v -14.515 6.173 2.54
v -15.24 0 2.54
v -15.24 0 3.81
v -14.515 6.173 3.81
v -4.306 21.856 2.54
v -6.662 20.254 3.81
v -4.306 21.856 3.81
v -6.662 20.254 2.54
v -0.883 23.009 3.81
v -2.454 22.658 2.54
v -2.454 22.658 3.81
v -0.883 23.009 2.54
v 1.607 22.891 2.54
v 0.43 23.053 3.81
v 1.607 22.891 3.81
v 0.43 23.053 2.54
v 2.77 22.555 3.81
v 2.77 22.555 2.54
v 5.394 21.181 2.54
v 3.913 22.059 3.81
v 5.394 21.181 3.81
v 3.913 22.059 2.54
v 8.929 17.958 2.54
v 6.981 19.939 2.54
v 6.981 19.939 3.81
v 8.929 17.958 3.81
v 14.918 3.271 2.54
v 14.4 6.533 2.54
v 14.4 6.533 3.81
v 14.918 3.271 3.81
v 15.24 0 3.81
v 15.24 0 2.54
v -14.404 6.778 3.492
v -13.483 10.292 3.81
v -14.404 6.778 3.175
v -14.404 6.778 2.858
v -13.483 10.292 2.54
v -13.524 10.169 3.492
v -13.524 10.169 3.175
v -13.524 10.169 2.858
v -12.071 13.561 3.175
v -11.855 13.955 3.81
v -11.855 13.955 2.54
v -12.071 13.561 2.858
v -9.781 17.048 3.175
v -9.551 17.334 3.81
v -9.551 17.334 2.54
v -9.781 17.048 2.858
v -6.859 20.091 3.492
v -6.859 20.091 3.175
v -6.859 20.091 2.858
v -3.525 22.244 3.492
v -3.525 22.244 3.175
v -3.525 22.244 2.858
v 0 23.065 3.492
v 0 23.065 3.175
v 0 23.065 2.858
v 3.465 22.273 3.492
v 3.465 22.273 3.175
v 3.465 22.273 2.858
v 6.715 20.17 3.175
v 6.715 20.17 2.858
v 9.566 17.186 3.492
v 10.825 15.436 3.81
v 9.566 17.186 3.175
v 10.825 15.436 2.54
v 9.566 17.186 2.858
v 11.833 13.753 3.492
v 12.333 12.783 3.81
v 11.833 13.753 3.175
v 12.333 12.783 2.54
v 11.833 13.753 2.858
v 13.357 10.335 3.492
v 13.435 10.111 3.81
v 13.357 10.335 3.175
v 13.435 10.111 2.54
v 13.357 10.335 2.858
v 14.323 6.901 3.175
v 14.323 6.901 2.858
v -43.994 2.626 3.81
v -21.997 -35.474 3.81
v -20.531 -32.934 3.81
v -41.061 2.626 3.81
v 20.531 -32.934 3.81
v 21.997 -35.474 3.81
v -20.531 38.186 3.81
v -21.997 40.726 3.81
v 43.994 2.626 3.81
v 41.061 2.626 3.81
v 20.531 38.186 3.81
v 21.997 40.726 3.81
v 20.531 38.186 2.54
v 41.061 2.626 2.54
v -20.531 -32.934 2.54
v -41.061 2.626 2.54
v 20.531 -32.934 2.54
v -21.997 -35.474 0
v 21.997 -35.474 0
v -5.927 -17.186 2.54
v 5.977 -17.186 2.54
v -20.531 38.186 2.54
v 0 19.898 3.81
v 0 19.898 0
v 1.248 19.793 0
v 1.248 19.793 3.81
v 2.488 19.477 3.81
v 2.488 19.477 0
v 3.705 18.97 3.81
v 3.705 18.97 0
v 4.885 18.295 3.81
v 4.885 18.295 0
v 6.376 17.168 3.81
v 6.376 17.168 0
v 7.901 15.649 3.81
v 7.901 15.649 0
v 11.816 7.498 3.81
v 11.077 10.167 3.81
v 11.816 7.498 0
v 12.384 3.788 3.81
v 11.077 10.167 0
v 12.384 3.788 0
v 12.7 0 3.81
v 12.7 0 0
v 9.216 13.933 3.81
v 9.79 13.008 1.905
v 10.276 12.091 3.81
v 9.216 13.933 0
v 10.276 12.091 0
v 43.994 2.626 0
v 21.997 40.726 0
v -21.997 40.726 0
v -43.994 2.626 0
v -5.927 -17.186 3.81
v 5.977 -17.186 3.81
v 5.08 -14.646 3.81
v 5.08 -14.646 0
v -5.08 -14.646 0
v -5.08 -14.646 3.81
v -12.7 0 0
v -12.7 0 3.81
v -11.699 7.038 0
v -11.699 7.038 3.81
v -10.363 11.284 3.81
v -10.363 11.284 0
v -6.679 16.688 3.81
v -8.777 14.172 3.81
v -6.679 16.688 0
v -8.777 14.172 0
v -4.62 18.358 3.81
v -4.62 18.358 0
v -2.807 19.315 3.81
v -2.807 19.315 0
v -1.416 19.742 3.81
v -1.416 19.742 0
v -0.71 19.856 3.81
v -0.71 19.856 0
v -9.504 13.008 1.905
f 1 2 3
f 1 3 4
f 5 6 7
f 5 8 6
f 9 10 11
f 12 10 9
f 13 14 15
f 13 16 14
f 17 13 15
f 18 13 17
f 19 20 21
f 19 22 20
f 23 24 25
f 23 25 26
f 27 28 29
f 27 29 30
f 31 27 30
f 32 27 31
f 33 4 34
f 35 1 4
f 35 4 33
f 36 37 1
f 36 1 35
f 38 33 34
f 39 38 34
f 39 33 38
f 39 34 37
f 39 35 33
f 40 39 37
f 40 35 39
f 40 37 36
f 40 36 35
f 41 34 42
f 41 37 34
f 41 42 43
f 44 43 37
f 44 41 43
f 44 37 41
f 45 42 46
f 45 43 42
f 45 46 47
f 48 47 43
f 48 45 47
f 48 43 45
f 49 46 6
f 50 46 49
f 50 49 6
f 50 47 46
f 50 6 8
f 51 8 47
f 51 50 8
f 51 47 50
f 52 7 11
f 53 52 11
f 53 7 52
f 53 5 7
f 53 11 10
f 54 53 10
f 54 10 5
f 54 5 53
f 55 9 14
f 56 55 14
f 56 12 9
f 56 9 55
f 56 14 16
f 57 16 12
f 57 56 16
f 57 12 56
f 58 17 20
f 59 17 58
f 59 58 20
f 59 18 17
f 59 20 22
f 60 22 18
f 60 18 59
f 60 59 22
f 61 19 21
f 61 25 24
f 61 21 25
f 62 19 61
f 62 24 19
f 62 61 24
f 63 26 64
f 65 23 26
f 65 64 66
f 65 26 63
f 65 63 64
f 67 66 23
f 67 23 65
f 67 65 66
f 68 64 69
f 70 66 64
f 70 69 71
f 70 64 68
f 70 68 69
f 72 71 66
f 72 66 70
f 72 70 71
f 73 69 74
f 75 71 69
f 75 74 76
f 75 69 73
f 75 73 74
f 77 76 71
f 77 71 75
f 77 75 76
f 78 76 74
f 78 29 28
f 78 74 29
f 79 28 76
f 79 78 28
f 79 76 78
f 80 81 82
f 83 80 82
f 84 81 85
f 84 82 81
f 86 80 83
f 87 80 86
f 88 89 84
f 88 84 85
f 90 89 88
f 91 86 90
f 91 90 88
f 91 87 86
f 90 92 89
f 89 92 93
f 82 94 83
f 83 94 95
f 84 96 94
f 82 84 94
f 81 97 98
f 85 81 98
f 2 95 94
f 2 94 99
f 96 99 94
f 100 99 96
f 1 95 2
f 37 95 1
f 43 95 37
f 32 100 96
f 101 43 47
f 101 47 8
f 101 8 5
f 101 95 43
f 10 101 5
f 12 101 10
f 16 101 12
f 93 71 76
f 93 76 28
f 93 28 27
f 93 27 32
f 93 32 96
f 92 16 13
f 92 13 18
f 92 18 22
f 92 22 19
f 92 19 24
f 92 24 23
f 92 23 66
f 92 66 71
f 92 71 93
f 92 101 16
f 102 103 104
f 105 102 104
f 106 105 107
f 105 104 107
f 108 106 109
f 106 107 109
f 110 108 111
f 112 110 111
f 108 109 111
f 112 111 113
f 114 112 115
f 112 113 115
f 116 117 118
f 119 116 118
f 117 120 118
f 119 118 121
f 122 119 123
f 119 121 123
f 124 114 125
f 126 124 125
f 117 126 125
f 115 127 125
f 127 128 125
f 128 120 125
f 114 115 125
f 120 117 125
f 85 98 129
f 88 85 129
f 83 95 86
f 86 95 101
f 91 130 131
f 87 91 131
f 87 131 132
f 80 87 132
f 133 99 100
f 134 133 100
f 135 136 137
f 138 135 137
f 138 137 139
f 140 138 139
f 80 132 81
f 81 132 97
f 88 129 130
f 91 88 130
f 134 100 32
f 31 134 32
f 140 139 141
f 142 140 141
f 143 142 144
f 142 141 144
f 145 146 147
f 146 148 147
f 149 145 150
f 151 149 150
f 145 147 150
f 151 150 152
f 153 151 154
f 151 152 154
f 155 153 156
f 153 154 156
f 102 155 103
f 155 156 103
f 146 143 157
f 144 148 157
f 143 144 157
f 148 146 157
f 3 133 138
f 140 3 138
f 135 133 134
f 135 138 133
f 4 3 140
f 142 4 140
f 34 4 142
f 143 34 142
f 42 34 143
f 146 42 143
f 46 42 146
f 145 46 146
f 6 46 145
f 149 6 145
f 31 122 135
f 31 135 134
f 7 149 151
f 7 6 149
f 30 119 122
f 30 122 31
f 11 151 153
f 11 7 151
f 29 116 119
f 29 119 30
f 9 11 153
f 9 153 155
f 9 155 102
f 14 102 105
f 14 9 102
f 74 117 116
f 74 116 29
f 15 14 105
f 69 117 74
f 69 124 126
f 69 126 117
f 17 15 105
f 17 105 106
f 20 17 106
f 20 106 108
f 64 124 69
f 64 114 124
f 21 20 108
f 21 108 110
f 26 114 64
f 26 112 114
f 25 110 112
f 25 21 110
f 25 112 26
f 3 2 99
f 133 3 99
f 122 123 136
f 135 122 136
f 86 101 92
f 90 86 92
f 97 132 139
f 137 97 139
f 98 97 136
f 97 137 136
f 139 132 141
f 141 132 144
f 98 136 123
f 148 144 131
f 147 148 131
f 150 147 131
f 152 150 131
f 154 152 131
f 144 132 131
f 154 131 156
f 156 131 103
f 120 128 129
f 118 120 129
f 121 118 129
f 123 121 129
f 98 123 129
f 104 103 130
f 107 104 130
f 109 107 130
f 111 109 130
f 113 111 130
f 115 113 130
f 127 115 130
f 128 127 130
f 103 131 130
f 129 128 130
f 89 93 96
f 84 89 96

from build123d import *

# Parameters (mm, degrees)
F1_DEPTH = 2.54
F2_DEPTH = 3.81


with BuildPart() as f1:
    # F0 (on Top) → F1 (new body)
    with BuildSketch(Plane.XY):
        Polygon((41.0611511448, 2.6256455048), (20.5305755724, 38.1856455048), (-20.5305755724, 38.1856455048), (-41.0611511448, 2.6256455048), (-20.5305755724, -32.9343544952), (20.5305755724, -32.9343544952), align=None)
        with BuildLine():
            Line((5.977419205, -17.1863544952), (-5.9265298769, -17.1863544952))
            Line((-5.9265298769, -17.1863544952), (-15.24, 0))
            add(Edge.make_bspline(
                [(-15.24, 0), (-14.825320596, 4.5149536905), (-14.1191885863, 13.7915187507), (0.0347505737, 27.7548005127), (13.7424625985, 13.9441287254), (14.8598540172, 4.6121058638), (15.24, 0)],
                knots=[0, 0, 0, 0, 0.2439742516, 0.5002224701, 0.7539137221, 1, 1, 1, 1], degree=3))
            Line((15.24, 0), (5.977419205, -17.1863544952))
        make_face(mode=Mode.SUBTRACT)
    extrude(amount=F1_DEPTH)

    # F0 (on Top) → F2 (join)
    with BuildSketch(Plane.XY):
        Polygon((43.9940905122, 2.6256455048), (21.9970452561, 40.7256455048), (-21.9970452561, 40.7256455048), (-43.9940905122, 2.6256455048), (-21.9970452561, -35.4743544952), (21.9970452561, -35.4743544952), align=None)
        Polygon((-20.5305755724, 38.1856455048), (20.5305755724, 38.1856455048), (41.0611511448, 2.6256455048), (20.5305755724, -32.9343544952), (-20.5305755724, -32.9343544952), (-41.0611511448, 2.6256455048), align=None, mode=Mode.SUBTRACT)
        with BuildLine():
            Line((-15.24, 0), (-5.9265298769, -17.1863544952))
            Line((-5.9265298769, -17.1863544952), (5.977419205, -17.1863544952))
            Line((5.977419205, -17.1863544952), (15.24, 0))
            add(Edge.make_bspline(
                [(-15.24, 0), (-14.825320596, 4.5149536905), (-14.1191885863, 13.7915187507), (0.0347505737, 27.7548005127), (13.7424625985, 13.9441287254), (14.8598540172, 4.6121058638), (15.24, 0)],
                knots=[0, 0, 0, 0, 0.2439742516, 0.5002224701, 0.7539137221, 1, 1, 1, 1], degree=3))
        make_face()
        with BuildLine():
            Line((-5.08, -14.6463544952), (-12.7, 0))
            add(Edge.make_bspline(
                [(-12.7, 0), (-12.2253034569, 4.5328203475), (-11.3062432336, 13.3088161737), (-3.7440989744, 19.8728472347), (0, 19.8976455048)],
                knots=[0, 0, 0, 0, 0.2577987782, 0.4991243481, 0.4991243481, 0.4991243481, 0.4991243481], degree=3))
            add(Edge.make_bspline(
                [(0, 19.8976455048), (3.7810393885, 19.922688442), (11.7360520972, 13.3740822085), (12.372977607, 4.5371999405), (12.7, 0)],
                knots=[0.4991243481, 0.4991243481, 0.4991243481, 0.4991243481, 0.7428309093, 1, 1, 1, 1], degree=3))
            Line((12.7, 0), (5.08, -14.6463544952))
            Line((5.08, -14.6463544952), (0, -14.6463544952))
            Line((0, -14.6463544952), (-5.08, -14.6463544952))
        make_face(mode=Mode.SUBTRACT)
    extrude(amount=F2_DEPTH)


solid = f1.part
